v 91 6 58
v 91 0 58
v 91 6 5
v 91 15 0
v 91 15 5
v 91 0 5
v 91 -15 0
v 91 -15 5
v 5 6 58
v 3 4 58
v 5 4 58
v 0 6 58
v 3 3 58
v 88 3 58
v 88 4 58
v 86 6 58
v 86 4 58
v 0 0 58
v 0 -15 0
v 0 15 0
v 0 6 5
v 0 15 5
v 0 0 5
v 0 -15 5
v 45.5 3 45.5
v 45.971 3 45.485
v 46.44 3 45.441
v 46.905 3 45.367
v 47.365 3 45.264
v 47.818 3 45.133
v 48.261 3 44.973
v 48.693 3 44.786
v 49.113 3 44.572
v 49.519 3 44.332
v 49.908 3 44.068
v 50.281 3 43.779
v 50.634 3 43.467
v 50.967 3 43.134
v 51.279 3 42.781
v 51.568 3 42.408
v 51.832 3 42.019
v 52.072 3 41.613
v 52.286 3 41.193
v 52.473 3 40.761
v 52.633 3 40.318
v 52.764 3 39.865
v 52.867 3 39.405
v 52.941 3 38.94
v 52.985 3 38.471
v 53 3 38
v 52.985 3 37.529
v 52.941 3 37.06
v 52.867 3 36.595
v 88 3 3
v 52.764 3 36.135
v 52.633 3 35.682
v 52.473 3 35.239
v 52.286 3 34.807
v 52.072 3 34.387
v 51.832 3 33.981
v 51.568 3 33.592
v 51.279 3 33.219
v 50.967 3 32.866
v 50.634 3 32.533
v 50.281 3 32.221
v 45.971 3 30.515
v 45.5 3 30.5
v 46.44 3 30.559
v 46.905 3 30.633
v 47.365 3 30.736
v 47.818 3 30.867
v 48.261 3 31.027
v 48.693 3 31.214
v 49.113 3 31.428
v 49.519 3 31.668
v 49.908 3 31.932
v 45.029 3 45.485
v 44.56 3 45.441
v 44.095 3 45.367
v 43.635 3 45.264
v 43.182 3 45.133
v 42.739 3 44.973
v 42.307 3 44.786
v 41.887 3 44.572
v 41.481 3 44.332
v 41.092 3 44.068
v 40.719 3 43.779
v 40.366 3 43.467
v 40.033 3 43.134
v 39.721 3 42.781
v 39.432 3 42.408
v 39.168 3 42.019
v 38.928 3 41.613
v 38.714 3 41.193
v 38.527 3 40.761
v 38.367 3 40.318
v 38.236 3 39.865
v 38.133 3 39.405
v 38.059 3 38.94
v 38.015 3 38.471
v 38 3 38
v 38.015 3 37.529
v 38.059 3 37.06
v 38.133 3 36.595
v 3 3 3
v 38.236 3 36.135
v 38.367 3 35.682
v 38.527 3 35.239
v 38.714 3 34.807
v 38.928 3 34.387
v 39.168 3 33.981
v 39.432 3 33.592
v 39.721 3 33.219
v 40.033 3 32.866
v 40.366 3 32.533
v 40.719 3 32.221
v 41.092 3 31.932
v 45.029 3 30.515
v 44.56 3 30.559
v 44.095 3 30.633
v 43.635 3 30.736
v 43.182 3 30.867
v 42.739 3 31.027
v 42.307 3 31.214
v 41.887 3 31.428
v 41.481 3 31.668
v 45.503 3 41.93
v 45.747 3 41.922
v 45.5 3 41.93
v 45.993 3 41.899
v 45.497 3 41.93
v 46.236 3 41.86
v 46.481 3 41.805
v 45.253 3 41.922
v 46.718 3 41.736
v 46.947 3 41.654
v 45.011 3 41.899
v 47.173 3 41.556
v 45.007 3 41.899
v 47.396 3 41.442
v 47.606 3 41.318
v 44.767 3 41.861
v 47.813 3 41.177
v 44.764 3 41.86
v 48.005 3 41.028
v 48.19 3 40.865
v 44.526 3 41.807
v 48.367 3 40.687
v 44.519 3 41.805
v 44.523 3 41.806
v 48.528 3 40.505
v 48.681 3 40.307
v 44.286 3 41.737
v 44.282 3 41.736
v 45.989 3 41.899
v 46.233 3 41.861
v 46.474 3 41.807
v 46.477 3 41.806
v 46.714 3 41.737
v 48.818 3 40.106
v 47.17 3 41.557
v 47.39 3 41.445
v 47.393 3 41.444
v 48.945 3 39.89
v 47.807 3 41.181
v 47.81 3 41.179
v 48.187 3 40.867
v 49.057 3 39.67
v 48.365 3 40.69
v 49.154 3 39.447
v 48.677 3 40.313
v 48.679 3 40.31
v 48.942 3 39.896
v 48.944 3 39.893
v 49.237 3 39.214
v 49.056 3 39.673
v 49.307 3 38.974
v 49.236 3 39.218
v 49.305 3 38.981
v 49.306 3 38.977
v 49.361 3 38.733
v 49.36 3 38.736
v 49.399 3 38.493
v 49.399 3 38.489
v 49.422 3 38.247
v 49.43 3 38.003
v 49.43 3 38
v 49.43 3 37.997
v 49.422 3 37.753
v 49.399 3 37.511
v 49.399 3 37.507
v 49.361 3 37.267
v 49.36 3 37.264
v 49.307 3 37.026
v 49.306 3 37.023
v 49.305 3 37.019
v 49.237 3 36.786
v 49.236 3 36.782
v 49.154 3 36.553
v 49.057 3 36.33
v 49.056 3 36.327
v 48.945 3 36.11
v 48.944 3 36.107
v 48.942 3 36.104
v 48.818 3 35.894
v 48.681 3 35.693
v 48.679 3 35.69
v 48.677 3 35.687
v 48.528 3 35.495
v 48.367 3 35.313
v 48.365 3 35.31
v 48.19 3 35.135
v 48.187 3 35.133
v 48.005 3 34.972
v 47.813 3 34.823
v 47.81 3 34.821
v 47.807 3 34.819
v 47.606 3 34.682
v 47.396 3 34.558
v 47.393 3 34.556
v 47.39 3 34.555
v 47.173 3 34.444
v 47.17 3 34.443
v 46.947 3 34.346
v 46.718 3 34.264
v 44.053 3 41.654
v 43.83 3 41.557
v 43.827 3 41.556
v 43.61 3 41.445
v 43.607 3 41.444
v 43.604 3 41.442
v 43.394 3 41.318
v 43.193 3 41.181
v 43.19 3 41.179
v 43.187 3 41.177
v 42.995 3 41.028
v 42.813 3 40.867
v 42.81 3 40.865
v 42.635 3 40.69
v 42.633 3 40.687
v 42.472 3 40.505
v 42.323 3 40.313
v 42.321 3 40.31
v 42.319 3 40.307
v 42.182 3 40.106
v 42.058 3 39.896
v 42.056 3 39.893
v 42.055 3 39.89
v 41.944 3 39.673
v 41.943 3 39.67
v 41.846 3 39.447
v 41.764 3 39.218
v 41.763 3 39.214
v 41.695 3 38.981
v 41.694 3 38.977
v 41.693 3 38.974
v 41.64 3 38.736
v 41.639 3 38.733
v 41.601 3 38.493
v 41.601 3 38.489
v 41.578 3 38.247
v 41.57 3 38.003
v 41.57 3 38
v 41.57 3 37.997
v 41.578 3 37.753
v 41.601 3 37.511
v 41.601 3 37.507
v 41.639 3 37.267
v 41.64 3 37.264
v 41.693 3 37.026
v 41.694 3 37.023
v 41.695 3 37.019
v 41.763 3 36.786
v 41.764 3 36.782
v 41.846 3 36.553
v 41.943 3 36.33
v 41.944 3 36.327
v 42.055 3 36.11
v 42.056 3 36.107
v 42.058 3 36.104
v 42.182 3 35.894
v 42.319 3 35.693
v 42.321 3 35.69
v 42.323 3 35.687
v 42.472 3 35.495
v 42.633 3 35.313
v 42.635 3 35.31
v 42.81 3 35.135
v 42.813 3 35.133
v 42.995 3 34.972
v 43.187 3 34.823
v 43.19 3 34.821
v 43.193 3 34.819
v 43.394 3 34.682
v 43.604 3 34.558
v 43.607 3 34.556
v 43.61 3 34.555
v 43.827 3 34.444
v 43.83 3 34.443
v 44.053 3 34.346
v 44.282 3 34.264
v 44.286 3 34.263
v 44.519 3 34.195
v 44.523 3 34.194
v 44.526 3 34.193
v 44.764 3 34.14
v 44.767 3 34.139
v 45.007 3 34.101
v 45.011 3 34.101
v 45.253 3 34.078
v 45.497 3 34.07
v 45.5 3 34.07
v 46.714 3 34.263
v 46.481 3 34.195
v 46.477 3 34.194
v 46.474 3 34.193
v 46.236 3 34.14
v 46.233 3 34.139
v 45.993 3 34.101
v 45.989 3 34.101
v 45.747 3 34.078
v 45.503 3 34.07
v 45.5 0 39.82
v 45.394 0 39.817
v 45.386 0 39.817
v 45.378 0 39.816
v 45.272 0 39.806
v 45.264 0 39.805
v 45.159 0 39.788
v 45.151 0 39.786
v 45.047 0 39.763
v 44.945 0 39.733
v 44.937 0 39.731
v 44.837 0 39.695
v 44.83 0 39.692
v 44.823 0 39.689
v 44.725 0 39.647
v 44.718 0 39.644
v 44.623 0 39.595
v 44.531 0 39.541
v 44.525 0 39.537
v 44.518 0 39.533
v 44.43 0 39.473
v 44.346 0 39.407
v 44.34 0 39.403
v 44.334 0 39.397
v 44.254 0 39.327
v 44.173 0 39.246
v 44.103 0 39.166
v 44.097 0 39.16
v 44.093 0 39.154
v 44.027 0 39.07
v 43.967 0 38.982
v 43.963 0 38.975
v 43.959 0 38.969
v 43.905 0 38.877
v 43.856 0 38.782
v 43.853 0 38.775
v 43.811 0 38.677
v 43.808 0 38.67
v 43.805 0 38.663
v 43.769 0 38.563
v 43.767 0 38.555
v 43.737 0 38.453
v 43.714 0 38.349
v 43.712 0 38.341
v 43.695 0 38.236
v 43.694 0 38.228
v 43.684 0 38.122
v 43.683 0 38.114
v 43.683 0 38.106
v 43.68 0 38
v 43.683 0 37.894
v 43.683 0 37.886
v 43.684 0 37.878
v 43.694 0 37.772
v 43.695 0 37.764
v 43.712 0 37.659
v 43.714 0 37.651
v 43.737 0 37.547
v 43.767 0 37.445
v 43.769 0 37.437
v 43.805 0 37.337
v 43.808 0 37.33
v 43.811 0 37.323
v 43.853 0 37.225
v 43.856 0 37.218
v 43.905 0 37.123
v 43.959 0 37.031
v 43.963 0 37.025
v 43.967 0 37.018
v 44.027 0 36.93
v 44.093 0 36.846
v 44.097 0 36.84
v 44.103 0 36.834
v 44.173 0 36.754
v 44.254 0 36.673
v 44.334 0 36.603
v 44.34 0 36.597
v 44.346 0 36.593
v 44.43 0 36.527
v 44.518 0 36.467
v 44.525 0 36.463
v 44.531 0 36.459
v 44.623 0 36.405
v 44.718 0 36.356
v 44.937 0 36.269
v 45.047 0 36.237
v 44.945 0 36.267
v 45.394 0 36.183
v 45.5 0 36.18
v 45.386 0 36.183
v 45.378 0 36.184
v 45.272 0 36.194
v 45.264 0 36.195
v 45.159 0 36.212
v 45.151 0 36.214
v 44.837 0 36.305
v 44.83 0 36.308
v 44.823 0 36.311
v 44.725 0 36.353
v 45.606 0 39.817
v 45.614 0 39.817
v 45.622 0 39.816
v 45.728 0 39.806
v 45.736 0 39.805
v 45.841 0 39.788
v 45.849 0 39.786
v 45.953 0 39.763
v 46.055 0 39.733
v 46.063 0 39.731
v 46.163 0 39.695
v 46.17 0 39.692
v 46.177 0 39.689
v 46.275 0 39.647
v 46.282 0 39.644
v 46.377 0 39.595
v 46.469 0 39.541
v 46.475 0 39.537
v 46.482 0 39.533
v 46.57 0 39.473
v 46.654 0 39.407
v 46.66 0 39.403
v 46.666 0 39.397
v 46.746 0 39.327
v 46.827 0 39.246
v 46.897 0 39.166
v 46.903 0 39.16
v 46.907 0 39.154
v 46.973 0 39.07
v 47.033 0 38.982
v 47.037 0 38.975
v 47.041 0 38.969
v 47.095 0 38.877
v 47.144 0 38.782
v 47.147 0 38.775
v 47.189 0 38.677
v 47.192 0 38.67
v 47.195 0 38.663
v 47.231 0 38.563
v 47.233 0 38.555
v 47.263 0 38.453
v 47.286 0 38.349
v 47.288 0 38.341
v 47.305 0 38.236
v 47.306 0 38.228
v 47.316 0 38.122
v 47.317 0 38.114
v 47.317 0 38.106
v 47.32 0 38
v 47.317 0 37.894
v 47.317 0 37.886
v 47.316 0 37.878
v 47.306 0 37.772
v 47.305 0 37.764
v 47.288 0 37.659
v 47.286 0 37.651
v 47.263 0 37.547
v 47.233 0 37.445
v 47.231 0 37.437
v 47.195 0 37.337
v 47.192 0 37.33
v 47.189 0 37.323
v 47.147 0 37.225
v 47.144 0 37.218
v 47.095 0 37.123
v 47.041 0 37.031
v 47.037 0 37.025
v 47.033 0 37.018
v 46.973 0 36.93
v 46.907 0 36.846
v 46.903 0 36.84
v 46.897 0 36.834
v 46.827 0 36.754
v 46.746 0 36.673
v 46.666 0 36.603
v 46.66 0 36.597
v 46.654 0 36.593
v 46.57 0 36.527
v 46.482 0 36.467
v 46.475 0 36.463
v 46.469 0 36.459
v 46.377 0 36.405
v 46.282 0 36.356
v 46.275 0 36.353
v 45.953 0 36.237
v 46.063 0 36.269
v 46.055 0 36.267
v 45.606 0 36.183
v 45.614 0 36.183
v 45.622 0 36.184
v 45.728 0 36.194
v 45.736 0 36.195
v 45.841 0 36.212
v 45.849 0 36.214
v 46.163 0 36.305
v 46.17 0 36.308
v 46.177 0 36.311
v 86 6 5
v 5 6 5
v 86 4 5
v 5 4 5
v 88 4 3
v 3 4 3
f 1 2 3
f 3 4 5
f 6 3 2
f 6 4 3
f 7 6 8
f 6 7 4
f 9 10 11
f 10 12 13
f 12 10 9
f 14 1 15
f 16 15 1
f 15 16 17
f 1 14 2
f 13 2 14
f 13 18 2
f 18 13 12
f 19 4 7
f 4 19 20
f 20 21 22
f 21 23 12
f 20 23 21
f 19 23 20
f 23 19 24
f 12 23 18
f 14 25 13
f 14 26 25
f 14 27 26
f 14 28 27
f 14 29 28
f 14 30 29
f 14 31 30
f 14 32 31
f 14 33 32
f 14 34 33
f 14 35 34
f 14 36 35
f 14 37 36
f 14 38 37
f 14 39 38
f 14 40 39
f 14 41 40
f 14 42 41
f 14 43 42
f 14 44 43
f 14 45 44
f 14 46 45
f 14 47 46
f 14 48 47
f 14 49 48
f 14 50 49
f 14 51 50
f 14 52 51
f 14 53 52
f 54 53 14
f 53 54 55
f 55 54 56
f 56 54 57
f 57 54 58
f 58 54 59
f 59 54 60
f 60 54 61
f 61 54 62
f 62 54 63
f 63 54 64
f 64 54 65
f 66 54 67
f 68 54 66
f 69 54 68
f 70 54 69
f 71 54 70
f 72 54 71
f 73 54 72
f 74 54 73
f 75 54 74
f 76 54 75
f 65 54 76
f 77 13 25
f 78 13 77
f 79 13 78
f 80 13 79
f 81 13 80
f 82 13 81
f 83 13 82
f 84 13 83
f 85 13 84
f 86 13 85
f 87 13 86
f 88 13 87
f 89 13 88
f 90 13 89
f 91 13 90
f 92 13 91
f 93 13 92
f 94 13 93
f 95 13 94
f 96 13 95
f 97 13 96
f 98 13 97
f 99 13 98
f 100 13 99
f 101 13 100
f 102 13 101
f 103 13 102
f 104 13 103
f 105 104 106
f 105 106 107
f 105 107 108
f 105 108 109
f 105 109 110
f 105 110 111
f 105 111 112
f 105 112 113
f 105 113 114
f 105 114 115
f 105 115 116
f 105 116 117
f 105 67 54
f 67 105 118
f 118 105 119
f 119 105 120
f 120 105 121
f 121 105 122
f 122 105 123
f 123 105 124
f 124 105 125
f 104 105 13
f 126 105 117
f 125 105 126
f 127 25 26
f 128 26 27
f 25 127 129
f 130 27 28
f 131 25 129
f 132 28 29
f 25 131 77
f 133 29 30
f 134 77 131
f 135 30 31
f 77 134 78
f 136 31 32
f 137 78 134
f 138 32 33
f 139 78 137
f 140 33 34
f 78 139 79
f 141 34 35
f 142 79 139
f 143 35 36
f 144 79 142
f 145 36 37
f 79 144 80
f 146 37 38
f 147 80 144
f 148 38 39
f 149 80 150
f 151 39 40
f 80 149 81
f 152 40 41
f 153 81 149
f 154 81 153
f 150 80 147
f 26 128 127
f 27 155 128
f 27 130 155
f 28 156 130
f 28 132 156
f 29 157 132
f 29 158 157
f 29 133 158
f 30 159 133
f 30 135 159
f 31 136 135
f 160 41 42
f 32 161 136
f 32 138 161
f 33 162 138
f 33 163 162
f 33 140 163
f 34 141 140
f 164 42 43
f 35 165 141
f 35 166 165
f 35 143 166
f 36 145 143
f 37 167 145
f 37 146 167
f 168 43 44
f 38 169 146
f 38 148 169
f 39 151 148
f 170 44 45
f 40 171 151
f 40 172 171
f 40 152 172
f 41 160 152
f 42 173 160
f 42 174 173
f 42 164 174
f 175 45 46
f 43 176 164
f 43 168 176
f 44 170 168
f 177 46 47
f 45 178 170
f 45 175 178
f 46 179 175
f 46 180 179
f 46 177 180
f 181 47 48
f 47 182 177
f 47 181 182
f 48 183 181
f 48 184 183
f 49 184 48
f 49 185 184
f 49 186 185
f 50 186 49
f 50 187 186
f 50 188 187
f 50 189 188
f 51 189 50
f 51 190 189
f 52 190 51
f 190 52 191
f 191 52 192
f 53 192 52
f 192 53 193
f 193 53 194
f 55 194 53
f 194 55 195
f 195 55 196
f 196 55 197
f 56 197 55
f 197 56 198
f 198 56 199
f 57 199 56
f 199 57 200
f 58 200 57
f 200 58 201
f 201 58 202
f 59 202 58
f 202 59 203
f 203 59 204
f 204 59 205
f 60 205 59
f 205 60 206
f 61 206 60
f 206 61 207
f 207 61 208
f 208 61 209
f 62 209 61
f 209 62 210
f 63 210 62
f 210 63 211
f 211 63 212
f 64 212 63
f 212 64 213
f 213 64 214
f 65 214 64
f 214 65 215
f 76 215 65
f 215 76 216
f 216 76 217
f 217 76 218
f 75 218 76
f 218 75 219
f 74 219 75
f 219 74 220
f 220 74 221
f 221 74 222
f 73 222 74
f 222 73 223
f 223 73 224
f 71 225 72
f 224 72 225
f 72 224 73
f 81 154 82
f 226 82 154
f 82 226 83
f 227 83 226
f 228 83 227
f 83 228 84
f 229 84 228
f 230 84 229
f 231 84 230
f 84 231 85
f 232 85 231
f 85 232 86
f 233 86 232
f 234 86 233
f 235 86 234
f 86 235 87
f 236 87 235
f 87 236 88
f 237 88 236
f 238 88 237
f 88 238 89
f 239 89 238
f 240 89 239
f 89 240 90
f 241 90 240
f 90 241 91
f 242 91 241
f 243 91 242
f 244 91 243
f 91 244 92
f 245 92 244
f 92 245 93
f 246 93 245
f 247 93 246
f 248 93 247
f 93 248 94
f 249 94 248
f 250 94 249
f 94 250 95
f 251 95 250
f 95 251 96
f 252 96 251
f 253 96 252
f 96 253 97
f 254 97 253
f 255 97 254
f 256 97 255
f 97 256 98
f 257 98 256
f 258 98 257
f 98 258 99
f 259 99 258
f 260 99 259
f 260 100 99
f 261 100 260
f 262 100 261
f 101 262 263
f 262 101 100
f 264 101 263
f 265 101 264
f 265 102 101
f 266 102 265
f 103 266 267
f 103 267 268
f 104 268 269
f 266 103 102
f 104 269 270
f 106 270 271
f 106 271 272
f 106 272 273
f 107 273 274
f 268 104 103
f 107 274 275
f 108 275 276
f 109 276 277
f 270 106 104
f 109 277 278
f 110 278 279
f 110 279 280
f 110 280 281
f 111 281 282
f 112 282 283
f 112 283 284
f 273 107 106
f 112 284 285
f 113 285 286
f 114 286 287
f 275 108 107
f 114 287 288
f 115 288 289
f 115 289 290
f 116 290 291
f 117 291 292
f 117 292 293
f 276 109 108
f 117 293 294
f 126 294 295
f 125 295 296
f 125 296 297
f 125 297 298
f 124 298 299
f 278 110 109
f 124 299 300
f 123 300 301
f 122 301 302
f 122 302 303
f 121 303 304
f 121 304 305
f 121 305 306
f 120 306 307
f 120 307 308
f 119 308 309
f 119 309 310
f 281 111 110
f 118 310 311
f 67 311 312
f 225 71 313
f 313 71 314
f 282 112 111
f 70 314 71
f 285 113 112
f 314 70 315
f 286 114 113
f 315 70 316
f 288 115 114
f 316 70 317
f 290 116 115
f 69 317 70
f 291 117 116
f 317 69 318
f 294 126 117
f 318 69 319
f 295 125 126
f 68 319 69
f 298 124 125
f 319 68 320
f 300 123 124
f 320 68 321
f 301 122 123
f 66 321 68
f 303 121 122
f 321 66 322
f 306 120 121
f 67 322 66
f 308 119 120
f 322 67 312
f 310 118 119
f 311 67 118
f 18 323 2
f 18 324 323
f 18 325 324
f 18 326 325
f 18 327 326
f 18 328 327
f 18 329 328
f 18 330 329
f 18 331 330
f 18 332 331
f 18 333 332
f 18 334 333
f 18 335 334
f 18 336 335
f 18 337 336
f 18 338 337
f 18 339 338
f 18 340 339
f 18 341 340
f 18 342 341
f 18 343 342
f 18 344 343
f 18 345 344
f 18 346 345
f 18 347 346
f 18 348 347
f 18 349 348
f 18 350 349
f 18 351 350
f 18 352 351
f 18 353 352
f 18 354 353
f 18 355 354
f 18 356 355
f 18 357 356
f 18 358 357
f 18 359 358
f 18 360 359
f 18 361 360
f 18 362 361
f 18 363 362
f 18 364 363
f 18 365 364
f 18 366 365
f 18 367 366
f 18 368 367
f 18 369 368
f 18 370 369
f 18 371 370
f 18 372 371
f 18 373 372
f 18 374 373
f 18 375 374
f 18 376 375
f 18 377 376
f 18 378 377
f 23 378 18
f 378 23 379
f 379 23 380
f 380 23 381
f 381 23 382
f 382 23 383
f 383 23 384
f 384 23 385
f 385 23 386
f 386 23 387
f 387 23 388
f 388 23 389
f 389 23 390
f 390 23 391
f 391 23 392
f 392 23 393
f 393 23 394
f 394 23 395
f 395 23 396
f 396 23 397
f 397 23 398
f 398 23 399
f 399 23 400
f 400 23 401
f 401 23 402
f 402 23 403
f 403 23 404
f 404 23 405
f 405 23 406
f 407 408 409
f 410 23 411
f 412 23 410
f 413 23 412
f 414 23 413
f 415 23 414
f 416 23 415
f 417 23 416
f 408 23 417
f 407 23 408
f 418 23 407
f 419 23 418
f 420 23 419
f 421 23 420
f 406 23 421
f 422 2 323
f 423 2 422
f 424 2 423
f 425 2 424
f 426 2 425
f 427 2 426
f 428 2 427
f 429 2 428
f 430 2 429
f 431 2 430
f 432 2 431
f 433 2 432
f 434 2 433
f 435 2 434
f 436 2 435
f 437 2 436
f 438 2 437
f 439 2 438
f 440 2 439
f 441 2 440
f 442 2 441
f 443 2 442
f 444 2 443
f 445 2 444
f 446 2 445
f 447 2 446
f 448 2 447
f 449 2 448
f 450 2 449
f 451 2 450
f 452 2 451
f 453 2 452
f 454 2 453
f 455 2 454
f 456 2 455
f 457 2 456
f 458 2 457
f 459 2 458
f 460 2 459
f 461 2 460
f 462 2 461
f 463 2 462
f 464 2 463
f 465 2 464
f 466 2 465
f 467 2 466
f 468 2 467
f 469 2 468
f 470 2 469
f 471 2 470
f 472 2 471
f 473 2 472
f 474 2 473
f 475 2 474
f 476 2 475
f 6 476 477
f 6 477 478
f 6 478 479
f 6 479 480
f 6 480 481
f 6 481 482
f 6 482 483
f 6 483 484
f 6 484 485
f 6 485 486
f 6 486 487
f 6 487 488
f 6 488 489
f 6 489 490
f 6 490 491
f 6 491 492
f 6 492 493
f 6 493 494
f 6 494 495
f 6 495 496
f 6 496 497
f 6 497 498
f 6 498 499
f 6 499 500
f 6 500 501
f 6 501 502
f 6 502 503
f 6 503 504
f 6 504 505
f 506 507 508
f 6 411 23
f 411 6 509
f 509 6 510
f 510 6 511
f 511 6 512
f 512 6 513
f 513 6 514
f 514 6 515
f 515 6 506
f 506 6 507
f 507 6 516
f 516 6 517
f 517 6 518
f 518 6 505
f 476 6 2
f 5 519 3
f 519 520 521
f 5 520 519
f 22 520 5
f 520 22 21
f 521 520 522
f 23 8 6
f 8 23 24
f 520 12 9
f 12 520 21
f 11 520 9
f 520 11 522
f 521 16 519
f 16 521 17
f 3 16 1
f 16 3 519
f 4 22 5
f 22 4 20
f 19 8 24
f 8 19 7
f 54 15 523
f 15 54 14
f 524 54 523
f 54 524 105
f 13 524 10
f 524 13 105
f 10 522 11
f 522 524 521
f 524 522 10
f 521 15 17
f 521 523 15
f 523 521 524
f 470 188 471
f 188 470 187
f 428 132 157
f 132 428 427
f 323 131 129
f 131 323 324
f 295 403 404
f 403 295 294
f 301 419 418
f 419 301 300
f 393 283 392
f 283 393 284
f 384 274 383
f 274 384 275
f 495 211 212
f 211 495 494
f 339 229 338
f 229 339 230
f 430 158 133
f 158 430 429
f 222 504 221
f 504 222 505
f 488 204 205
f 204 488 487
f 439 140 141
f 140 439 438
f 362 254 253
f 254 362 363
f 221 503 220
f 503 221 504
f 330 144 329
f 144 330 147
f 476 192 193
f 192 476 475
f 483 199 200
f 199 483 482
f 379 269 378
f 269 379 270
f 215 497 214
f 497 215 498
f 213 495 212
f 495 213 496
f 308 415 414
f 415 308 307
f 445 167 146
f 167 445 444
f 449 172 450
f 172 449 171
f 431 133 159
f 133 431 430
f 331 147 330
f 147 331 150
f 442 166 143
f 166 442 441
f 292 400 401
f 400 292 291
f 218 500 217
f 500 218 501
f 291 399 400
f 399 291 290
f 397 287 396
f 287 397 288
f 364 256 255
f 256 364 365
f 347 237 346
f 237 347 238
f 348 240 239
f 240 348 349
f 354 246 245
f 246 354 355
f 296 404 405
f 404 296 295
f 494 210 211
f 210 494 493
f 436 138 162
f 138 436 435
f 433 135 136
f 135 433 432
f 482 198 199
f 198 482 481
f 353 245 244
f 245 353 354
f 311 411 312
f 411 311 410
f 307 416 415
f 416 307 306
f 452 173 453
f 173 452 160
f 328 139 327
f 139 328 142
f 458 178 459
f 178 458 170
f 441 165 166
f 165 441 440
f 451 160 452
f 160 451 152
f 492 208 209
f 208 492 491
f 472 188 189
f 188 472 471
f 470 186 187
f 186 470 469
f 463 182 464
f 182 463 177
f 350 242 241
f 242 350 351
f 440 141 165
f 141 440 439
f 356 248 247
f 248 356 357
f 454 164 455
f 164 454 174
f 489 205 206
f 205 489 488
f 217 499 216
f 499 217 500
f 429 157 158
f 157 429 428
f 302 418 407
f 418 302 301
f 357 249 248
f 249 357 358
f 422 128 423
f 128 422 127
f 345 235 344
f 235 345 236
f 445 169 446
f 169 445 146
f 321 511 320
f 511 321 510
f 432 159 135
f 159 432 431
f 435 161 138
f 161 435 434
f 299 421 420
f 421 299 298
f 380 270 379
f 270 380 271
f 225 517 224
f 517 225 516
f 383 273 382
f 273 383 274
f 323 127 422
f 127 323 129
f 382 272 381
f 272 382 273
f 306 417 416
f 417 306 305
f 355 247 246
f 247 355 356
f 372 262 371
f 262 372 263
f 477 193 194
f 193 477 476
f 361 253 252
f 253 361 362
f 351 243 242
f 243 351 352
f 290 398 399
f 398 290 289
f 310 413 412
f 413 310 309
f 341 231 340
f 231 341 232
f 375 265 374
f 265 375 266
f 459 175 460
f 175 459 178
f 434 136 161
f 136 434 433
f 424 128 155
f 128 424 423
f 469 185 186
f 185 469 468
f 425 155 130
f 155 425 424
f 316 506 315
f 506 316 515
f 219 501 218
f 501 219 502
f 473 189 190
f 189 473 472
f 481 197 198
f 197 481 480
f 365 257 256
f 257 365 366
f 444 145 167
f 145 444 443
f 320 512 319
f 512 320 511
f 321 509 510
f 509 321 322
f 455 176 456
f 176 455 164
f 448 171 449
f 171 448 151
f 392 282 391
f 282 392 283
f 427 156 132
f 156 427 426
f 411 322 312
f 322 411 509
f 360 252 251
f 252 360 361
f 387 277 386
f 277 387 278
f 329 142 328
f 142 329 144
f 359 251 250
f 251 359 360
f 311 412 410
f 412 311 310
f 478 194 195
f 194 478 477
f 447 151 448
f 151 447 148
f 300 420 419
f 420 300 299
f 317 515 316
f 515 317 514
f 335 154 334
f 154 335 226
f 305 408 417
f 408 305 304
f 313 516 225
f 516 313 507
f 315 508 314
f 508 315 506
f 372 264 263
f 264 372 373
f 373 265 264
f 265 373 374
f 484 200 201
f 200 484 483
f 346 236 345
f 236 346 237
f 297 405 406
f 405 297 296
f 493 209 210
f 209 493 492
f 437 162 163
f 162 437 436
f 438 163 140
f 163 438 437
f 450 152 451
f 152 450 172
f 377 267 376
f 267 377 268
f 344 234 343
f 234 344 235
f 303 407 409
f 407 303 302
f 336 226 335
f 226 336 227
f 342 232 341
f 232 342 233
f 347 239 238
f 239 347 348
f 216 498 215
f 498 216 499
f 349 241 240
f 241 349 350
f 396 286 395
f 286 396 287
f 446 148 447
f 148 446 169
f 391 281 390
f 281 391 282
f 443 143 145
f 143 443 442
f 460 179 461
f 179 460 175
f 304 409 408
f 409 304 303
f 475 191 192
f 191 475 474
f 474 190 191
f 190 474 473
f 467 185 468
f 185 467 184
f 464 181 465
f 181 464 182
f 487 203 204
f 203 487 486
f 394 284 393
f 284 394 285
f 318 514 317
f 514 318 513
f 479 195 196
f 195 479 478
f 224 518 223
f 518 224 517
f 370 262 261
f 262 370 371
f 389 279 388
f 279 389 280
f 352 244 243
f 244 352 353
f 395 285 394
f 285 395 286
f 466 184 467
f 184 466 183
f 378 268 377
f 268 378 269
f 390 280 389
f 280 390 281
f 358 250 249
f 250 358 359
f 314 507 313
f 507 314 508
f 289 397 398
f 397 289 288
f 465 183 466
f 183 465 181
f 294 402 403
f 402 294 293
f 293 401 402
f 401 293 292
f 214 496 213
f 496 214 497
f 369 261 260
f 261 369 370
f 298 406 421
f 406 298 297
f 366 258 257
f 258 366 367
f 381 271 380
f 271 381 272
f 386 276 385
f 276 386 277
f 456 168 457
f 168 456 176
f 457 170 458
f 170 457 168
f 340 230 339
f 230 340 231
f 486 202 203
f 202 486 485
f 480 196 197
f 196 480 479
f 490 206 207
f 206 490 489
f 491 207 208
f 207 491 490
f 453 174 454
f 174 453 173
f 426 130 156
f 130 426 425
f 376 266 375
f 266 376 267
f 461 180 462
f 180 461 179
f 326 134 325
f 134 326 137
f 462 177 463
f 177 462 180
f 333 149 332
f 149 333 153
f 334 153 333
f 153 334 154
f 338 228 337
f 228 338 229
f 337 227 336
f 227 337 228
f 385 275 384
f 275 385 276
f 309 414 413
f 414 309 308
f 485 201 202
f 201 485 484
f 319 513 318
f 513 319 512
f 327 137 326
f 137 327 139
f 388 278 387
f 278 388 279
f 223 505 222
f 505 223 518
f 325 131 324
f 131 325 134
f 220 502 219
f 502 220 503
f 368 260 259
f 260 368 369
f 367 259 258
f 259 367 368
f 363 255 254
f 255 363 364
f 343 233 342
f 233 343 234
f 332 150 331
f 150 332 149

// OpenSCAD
// Internal width
Width = 85; // [30:150]
// Internal height
Height = 55; // [30:150]

// Stand width. 0 for no stand
Stand = 30;
// With hole for screw
WithHole = true;

module frame() {
    WidthAndBorder = Width + 6;
    HeightAndBorder = Height + 3;
    difference() {
        union() {            
            cube([WidthAndBorder,3,HeightAndBorder]);
            cube([WidthAndBorder,6,5]);       
            cube([5,6,HeightAndBorder]);  
            translate([WidthAndBorder - 5,0,0]) cube([5,6,HeightAndBorder]);     
            if (Stand > 0) {
                translate([0,-Stand/2,0]) cube([WidthAndBorder,Stand,5]);
            }  
        }
        translate([3,3,3]) cube([Width,1,HeightAndBorder]);
        if (WithHole) {
            translate([WidthAndBorder/2,-0.1,HeightAndBorder-20]) rotate([-90,0,0]) 
                cylinder(d = 15 - 0.1, h = 3 + 0.2, $fn = 100); 
        }
    }
    if (WithHole) {
        translate([WidthAndBorder/2,0,HeightAndBorder-20]) rotate([-90,0,0]) 
            difference(){  
                cylinder(d = 15, h = 3, $fn = 100);
                translate([0,0,-0.1]) cylinder(d1 = 3.5, d2 = 8, h = 3.2, $fn = 100);
            }
    }    
}

frame();
